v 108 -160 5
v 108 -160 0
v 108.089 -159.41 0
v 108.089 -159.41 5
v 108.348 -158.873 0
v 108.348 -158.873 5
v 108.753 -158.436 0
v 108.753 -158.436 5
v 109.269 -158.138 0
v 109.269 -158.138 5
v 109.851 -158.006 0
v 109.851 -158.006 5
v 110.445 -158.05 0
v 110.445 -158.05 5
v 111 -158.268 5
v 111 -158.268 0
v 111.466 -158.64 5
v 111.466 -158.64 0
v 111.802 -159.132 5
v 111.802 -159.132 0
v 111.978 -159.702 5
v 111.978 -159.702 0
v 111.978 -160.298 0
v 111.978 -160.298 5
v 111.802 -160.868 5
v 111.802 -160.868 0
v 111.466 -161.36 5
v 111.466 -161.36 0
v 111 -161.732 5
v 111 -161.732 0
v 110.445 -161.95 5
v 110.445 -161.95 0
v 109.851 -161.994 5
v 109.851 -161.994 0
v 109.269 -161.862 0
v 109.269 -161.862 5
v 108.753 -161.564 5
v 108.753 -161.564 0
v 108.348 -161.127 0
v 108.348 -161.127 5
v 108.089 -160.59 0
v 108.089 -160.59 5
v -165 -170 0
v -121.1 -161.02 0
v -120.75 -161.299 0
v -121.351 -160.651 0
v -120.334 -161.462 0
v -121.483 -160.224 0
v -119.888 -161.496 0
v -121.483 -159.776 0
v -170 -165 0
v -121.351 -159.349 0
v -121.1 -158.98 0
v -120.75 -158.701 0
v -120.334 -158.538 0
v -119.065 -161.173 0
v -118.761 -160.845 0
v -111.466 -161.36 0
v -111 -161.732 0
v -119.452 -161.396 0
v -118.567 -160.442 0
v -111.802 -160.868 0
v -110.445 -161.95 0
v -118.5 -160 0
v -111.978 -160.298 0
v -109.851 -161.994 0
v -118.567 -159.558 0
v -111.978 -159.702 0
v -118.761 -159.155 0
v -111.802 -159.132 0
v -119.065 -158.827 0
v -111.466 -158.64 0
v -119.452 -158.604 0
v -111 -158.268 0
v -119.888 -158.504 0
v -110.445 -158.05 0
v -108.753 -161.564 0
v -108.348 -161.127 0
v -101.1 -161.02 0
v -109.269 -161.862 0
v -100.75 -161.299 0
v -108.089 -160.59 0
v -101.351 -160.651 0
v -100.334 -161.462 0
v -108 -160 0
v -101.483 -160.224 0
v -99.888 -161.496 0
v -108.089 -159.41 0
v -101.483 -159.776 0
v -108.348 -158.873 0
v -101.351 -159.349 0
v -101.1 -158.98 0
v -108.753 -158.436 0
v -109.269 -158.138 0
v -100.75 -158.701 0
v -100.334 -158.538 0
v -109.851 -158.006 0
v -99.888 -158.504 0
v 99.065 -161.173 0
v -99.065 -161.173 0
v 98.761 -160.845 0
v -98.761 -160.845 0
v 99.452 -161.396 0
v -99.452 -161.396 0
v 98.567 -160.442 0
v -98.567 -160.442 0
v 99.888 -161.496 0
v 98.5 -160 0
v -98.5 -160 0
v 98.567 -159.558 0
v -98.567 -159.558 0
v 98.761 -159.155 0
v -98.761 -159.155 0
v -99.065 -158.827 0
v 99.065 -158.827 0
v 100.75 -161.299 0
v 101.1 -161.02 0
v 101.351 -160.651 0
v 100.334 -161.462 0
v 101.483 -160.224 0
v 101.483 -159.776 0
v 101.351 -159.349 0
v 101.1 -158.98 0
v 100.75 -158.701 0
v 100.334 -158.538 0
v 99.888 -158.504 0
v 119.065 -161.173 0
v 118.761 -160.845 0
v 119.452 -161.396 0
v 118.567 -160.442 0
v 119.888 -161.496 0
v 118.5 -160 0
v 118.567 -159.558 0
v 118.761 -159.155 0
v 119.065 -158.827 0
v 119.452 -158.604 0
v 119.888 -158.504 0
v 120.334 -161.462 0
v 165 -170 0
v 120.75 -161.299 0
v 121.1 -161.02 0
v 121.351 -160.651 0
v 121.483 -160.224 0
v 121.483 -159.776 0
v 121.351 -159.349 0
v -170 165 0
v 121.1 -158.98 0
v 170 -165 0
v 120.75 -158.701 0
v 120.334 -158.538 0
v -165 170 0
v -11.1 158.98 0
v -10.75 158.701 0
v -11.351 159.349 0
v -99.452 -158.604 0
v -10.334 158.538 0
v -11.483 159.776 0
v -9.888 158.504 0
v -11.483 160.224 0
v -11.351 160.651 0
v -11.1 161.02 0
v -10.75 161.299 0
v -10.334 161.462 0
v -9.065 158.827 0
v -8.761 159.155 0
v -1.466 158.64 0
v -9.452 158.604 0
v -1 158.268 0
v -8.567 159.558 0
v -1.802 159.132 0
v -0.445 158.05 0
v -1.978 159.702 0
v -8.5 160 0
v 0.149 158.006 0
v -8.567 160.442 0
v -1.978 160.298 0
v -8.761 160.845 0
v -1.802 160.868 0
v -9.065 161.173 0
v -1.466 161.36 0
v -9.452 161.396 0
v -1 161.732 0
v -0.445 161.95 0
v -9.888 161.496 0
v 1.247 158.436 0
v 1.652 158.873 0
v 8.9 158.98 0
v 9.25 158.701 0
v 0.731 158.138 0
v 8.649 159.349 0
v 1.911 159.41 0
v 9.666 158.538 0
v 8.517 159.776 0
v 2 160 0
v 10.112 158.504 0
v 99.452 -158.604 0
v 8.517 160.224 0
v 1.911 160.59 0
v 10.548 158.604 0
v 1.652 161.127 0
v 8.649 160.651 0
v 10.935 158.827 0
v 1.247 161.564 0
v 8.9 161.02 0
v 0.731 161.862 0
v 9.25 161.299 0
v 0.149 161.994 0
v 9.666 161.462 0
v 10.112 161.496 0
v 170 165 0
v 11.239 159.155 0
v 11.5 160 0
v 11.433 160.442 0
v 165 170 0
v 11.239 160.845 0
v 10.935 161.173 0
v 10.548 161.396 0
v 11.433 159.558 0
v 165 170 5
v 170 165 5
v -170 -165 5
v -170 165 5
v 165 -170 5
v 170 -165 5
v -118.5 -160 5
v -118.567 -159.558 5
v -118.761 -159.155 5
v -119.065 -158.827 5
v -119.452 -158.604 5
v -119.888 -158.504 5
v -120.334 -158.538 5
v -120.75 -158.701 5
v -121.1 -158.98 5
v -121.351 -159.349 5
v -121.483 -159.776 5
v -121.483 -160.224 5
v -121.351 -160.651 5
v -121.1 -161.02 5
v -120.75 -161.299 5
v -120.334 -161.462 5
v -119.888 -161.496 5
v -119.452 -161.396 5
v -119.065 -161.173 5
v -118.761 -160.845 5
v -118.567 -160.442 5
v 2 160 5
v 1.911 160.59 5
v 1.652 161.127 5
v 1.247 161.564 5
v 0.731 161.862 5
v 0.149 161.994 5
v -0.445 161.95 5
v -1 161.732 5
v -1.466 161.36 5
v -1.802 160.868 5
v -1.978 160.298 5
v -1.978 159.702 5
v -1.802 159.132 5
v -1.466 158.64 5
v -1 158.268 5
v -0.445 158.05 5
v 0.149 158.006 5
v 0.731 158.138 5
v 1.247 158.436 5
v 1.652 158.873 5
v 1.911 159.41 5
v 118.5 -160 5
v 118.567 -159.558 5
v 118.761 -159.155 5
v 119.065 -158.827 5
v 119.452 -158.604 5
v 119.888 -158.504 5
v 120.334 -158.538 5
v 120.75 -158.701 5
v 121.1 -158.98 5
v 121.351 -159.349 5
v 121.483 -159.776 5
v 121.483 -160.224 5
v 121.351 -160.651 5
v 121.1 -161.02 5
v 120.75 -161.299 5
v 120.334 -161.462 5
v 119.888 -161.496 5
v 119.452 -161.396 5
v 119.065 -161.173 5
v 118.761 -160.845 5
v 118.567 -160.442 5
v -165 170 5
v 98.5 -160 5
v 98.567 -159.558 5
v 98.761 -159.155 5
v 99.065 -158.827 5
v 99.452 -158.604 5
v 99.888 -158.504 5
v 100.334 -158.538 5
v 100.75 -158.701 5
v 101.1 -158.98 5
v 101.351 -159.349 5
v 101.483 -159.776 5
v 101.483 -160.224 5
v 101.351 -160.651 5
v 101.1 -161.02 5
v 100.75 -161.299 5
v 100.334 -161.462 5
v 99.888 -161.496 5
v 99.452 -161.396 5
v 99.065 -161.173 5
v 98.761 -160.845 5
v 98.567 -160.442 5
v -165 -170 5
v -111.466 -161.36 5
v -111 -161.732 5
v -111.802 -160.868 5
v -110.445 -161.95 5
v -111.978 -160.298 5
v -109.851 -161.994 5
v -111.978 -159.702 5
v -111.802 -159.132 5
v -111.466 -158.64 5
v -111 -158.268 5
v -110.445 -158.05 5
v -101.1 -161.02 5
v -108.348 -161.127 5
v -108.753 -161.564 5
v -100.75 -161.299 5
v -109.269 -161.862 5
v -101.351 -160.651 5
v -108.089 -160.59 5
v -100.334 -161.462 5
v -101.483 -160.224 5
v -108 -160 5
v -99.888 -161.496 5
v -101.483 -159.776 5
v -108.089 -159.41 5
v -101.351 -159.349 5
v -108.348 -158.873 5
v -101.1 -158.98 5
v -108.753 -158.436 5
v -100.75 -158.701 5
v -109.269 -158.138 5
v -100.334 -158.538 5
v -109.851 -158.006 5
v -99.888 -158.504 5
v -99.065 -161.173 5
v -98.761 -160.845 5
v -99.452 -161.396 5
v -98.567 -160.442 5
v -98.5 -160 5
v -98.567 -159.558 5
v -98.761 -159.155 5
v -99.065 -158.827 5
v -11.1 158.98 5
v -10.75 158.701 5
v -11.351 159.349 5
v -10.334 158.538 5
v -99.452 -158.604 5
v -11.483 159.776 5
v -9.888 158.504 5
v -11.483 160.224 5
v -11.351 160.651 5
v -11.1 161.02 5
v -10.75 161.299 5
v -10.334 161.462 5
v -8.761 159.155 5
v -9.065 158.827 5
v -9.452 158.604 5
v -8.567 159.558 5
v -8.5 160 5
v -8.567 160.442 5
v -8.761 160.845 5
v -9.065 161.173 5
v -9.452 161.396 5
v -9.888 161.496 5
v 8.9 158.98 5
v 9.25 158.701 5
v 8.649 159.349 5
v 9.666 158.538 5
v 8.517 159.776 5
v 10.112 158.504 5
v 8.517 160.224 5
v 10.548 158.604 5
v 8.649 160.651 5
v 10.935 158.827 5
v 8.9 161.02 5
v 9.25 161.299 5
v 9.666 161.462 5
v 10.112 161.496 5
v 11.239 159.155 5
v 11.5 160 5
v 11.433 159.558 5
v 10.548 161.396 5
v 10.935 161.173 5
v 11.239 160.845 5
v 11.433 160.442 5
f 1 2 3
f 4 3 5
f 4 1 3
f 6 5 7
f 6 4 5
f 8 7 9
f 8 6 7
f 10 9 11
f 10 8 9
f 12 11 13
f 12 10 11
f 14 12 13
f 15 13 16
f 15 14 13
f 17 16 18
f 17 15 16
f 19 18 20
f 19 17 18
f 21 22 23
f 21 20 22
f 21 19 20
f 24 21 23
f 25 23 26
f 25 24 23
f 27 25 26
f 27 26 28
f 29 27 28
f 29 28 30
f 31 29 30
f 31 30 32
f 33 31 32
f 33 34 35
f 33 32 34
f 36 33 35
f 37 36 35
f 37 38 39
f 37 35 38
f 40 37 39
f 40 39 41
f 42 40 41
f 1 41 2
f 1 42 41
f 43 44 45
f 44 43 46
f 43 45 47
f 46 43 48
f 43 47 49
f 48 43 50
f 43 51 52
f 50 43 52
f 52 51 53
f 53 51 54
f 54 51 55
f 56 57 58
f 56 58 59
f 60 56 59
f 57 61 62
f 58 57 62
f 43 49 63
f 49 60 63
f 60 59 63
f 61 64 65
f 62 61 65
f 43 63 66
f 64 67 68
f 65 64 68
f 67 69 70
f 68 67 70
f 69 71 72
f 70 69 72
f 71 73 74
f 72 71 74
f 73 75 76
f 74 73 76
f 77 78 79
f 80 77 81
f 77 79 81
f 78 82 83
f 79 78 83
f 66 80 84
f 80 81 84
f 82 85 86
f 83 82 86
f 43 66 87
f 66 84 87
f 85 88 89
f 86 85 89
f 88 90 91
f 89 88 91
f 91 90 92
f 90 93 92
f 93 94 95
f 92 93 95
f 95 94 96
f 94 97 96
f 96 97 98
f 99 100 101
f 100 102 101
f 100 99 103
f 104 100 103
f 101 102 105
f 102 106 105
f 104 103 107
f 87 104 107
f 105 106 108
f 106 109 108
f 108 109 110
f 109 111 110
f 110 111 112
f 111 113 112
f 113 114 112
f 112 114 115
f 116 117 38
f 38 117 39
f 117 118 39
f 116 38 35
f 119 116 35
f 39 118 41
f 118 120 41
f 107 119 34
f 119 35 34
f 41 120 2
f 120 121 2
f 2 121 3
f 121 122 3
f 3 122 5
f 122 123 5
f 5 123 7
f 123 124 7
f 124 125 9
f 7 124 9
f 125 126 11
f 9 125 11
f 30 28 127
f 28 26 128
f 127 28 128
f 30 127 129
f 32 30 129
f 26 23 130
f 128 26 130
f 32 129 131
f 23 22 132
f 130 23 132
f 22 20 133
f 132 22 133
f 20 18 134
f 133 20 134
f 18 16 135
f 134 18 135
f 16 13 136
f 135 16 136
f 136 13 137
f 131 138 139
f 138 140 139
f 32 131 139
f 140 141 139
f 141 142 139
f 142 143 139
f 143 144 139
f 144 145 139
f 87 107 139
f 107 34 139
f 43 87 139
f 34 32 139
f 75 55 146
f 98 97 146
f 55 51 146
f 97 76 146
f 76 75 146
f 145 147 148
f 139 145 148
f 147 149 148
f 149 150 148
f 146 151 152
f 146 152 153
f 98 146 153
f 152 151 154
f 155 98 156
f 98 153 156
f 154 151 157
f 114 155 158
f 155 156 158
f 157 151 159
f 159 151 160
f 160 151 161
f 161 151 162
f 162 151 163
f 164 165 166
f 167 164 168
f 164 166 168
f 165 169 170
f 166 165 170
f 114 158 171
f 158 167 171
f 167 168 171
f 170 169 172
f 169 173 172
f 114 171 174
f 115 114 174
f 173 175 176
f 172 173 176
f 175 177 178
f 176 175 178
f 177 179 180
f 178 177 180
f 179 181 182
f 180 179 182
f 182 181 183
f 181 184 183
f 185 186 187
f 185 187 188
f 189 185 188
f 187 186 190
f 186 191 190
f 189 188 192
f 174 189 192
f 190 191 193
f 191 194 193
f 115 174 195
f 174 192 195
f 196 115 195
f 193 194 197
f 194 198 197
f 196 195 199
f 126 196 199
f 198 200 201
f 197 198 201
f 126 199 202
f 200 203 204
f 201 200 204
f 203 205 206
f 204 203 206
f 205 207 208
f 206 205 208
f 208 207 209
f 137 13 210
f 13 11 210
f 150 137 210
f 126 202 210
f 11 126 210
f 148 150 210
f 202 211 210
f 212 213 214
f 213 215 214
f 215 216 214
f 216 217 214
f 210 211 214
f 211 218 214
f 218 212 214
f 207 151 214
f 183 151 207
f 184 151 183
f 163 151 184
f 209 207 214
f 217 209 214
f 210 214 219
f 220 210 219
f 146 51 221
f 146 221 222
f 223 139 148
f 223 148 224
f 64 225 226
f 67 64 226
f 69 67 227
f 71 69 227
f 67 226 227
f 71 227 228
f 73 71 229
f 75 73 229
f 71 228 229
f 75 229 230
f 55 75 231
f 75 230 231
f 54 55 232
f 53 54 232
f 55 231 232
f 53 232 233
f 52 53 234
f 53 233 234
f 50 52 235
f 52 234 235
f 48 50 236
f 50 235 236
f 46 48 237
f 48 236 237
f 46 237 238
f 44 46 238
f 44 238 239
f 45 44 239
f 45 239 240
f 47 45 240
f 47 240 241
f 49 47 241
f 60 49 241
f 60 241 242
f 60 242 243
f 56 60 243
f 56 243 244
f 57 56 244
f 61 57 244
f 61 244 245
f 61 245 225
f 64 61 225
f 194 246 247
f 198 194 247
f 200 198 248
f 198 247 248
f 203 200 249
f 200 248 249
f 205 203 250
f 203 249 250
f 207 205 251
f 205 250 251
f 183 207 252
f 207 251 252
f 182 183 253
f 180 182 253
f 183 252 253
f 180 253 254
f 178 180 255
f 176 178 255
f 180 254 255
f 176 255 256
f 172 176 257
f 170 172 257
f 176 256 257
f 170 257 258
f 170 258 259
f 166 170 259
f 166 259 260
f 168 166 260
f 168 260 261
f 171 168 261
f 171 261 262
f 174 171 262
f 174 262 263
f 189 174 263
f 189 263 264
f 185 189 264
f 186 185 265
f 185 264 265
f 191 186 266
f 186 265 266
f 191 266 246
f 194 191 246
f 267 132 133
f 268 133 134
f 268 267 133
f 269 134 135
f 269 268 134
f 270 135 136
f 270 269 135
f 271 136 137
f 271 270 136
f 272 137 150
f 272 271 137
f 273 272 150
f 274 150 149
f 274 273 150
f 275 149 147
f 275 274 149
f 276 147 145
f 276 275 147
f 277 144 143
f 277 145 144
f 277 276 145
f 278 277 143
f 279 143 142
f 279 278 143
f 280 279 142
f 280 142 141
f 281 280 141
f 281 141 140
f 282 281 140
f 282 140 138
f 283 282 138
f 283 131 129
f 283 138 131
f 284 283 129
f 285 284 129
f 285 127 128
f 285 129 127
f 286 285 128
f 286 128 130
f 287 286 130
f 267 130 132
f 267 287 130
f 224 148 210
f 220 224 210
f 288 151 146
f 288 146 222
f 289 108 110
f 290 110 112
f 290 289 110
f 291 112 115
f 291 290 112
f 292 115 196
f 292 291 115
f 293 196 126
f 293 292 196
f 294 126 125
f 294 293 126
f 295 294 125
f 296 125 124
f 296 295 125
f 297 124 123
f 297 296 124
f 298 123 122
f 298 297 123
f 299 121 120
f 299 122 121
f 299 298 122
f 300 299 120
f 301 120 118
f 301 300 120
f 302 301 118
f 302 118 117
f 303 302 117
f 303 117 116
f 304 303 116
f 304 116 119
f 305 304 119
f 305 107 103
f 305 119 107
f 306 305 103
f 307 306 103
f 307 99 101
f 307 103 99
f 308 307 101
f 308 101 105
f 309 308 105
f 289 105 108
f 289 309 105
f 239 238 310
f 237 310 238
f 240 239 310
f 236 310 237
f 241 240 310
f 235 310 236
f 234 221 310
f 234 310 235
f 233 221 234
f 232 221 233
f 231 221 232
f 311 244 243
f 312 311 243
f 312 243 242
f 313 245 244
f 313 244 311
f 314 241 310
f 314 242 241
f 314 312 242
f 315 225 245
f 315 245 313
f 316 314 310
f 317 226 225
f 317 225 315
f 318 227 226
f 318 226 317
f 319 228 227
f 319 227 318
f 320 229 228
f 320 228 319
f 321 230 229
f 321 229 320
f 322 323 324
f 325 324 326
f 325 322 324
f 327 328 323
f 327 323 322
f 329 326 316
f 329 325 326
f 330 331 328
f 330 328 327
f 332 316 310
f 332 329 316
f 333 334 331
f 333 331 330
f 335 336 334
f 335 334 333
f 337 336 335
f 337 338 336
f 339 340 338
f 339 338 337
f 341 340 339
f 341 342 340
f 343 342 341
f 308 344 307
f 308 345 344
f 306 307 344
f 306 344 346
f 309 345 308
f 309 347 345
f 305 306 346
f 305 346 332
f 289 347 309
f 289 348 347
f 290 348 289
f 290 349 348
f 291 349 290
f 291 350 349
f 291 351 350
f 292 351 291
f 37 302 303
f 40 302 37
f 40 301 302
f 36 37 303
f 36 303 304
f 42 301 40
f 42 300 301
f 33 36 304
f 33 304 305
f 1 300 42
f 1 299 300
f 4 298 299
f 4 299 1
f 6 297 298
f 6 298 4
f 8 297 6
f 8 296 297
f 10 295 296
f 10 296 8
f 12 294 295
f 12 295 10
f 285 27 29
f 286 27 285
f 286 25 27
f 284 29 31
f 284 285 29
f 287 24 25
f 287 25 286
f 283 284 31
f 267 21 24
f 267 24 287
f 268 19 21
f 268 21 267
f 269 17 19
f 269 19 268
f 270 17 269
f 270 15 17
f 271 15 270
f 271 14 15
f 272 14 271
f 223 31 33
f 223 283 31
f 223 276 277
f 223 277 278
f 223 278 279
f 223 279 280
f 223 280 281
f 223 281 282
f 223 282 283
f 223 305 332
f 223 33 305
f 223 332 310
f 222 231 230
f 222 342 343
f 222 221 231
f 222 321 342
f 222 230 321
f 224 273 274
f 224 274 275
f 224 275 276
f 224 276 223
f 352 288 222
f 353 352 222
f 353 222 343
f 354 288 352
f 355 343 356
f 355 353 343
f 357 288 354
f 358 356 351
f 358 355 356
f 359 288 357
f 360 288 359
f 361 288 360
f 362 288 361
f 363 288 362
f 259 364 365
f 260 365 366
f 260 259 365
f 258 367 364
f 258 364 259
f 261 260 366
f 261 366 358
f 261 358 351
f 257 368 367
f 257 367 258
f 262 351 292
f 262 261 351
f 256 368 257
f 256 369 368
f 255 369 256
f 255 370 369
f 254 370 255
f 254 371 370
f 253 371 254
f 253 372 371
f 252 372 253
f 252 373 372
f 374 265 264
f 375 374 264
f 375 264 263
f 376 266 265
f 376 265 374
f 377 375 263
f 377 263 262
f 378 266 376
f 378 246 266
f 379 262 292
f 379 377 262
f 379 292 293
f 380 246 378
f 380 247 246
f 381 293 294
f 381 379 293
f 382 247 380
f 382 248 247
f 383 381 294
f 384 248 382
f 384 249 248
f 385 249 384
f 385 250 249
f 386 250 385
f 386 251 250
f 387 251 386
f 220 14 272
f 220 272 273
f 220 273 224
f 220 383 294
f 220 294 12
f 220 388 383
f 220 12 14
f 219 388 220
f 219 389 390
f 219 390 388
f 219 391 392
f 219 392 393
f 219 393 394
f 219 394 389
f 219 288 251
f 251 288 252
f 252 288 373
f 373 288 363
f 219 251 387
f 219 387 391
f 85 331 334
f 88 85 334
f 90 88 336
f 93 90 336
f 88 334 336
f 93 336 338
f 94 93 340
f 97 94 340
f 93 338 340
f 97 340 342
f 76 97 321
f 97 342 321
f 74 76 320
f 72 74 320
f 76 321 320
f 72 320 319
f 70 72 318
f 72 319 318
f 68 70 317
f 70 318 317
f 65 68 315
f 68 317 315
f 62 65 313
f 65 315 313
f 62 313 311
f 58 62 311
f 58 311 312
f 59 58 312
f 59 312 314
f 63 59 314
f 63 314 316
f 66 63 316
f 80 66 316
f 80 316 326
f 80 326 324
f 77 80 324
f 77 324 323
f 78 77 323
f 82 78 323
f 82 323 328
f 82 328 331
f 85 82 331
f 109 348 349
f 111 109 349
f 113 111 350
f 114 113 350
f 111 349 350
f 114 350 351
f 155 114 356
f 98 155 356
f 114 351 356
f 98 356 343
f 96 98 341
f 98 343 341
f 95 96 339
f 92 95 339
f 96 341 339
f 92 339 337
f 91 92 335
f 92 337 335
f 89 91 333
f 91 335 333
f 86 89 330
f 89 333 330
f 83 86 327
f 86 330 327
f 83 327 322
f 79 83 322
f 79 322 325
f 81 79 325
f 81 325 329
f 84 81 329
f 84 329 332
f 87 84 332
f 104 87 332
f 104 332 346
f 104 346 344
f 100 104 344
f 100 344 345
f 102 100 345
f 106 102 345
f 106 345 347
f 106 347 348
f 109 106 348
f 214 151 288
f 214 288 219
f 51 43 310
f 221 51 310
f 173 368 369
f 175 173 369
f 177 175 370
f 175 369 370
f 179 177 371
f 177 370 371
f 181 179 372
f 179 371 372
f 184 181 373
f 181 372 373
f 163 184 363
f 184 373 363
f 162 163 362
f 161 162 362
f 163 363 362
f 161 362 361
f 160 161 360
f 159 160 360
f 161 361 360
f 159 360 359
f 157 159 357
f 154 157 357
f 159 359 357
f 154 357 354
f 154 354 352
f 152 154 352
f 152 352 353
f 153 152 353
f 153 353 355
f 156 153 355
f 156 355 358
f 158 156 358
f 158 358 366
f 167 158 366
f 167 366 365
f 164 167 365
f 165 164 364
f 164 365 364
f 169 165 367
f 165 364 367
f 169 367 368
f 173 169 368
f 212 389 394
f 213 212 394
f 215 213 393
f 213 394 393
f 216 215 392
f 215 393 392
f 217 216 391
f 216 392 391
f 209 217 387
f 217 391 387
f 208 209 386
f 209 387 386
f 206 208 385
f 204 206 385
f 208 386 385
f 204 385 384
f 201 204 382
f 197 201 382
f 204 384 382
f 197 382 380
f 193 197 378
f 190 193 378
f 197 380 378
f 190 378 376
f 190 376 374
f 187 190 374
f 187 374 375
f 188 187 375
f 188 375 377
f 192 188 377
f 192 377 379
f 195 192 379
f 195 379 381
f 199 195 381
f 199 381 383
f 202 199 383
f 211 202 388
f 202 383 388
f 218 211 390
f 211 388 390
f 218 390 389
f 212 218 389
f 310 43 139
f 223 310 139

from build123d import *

# Parameters (mm, degrees)
SKETCH1_W           = 340
SKETCH1_H           = 340
BOSS_EXTRUDE1_DEPTH = 5
SKETCH3_R           = 1.5
SKETCH3_R_2         = 2
CUT_EXTRUDE2_DEPTH  = 241.468293128
CHAMFER1_SIZE       = 5


with BuildPart() as part:
    # Sketch1 → Boss-Extrude1 (new body)
    with BuildSketch(Plane.XY):
        Rectangle(SKETCH1_W, SKETCH1_H)
    extrude(amount=BOSS_EXTRUDE1_DEPTH)

    # Sketch3 → Cut-Extrude2 (cut, through all)
    with BuildSketch(Plane.XY.offset(5)):
        with Locations((-120, -160)):
            Circle(SKETCH3_R)
        with Locations((-110, -160)):
            Circle(SKETCH3_R_2)
        with Locations((-100, -160)):
            Circle(SKETCH3_R)
        with Locations((-10, 160)):
            Circle(SKETCH3_R)
        with Locations((0, 160)):
            Circle(SKETCH3_R_2)
        with Locations((10, 160)):
            Circle(SKETCH3_R)
    cut_extrude2 = extrude(amount=-CUT_EXTRUDE2_DEPTH, mode=Mode.SUBTRACT)

    # Mirror1: Cut-Extrude2 across plane
    add(cut_extrude2.mirror(Plane(origin=(0, 0, 0), x_dir=(0, 0, 1), z_dir=(1, 0, 0))), mode=Mode.SUBTRACT)

    # Chamfer1
    chamfer1_edges = [part.edges().sort_by_distance(p)[0] for p in [
        (170, -170, 2.5),
        (-170, -170, 2.5),
        (-170, 170, 2.5),
        (170, 170, 2.5),
    ]]
    chamfer(chamfer1_edges, length=CHAMFER1_SIZE)


solid = part.part
